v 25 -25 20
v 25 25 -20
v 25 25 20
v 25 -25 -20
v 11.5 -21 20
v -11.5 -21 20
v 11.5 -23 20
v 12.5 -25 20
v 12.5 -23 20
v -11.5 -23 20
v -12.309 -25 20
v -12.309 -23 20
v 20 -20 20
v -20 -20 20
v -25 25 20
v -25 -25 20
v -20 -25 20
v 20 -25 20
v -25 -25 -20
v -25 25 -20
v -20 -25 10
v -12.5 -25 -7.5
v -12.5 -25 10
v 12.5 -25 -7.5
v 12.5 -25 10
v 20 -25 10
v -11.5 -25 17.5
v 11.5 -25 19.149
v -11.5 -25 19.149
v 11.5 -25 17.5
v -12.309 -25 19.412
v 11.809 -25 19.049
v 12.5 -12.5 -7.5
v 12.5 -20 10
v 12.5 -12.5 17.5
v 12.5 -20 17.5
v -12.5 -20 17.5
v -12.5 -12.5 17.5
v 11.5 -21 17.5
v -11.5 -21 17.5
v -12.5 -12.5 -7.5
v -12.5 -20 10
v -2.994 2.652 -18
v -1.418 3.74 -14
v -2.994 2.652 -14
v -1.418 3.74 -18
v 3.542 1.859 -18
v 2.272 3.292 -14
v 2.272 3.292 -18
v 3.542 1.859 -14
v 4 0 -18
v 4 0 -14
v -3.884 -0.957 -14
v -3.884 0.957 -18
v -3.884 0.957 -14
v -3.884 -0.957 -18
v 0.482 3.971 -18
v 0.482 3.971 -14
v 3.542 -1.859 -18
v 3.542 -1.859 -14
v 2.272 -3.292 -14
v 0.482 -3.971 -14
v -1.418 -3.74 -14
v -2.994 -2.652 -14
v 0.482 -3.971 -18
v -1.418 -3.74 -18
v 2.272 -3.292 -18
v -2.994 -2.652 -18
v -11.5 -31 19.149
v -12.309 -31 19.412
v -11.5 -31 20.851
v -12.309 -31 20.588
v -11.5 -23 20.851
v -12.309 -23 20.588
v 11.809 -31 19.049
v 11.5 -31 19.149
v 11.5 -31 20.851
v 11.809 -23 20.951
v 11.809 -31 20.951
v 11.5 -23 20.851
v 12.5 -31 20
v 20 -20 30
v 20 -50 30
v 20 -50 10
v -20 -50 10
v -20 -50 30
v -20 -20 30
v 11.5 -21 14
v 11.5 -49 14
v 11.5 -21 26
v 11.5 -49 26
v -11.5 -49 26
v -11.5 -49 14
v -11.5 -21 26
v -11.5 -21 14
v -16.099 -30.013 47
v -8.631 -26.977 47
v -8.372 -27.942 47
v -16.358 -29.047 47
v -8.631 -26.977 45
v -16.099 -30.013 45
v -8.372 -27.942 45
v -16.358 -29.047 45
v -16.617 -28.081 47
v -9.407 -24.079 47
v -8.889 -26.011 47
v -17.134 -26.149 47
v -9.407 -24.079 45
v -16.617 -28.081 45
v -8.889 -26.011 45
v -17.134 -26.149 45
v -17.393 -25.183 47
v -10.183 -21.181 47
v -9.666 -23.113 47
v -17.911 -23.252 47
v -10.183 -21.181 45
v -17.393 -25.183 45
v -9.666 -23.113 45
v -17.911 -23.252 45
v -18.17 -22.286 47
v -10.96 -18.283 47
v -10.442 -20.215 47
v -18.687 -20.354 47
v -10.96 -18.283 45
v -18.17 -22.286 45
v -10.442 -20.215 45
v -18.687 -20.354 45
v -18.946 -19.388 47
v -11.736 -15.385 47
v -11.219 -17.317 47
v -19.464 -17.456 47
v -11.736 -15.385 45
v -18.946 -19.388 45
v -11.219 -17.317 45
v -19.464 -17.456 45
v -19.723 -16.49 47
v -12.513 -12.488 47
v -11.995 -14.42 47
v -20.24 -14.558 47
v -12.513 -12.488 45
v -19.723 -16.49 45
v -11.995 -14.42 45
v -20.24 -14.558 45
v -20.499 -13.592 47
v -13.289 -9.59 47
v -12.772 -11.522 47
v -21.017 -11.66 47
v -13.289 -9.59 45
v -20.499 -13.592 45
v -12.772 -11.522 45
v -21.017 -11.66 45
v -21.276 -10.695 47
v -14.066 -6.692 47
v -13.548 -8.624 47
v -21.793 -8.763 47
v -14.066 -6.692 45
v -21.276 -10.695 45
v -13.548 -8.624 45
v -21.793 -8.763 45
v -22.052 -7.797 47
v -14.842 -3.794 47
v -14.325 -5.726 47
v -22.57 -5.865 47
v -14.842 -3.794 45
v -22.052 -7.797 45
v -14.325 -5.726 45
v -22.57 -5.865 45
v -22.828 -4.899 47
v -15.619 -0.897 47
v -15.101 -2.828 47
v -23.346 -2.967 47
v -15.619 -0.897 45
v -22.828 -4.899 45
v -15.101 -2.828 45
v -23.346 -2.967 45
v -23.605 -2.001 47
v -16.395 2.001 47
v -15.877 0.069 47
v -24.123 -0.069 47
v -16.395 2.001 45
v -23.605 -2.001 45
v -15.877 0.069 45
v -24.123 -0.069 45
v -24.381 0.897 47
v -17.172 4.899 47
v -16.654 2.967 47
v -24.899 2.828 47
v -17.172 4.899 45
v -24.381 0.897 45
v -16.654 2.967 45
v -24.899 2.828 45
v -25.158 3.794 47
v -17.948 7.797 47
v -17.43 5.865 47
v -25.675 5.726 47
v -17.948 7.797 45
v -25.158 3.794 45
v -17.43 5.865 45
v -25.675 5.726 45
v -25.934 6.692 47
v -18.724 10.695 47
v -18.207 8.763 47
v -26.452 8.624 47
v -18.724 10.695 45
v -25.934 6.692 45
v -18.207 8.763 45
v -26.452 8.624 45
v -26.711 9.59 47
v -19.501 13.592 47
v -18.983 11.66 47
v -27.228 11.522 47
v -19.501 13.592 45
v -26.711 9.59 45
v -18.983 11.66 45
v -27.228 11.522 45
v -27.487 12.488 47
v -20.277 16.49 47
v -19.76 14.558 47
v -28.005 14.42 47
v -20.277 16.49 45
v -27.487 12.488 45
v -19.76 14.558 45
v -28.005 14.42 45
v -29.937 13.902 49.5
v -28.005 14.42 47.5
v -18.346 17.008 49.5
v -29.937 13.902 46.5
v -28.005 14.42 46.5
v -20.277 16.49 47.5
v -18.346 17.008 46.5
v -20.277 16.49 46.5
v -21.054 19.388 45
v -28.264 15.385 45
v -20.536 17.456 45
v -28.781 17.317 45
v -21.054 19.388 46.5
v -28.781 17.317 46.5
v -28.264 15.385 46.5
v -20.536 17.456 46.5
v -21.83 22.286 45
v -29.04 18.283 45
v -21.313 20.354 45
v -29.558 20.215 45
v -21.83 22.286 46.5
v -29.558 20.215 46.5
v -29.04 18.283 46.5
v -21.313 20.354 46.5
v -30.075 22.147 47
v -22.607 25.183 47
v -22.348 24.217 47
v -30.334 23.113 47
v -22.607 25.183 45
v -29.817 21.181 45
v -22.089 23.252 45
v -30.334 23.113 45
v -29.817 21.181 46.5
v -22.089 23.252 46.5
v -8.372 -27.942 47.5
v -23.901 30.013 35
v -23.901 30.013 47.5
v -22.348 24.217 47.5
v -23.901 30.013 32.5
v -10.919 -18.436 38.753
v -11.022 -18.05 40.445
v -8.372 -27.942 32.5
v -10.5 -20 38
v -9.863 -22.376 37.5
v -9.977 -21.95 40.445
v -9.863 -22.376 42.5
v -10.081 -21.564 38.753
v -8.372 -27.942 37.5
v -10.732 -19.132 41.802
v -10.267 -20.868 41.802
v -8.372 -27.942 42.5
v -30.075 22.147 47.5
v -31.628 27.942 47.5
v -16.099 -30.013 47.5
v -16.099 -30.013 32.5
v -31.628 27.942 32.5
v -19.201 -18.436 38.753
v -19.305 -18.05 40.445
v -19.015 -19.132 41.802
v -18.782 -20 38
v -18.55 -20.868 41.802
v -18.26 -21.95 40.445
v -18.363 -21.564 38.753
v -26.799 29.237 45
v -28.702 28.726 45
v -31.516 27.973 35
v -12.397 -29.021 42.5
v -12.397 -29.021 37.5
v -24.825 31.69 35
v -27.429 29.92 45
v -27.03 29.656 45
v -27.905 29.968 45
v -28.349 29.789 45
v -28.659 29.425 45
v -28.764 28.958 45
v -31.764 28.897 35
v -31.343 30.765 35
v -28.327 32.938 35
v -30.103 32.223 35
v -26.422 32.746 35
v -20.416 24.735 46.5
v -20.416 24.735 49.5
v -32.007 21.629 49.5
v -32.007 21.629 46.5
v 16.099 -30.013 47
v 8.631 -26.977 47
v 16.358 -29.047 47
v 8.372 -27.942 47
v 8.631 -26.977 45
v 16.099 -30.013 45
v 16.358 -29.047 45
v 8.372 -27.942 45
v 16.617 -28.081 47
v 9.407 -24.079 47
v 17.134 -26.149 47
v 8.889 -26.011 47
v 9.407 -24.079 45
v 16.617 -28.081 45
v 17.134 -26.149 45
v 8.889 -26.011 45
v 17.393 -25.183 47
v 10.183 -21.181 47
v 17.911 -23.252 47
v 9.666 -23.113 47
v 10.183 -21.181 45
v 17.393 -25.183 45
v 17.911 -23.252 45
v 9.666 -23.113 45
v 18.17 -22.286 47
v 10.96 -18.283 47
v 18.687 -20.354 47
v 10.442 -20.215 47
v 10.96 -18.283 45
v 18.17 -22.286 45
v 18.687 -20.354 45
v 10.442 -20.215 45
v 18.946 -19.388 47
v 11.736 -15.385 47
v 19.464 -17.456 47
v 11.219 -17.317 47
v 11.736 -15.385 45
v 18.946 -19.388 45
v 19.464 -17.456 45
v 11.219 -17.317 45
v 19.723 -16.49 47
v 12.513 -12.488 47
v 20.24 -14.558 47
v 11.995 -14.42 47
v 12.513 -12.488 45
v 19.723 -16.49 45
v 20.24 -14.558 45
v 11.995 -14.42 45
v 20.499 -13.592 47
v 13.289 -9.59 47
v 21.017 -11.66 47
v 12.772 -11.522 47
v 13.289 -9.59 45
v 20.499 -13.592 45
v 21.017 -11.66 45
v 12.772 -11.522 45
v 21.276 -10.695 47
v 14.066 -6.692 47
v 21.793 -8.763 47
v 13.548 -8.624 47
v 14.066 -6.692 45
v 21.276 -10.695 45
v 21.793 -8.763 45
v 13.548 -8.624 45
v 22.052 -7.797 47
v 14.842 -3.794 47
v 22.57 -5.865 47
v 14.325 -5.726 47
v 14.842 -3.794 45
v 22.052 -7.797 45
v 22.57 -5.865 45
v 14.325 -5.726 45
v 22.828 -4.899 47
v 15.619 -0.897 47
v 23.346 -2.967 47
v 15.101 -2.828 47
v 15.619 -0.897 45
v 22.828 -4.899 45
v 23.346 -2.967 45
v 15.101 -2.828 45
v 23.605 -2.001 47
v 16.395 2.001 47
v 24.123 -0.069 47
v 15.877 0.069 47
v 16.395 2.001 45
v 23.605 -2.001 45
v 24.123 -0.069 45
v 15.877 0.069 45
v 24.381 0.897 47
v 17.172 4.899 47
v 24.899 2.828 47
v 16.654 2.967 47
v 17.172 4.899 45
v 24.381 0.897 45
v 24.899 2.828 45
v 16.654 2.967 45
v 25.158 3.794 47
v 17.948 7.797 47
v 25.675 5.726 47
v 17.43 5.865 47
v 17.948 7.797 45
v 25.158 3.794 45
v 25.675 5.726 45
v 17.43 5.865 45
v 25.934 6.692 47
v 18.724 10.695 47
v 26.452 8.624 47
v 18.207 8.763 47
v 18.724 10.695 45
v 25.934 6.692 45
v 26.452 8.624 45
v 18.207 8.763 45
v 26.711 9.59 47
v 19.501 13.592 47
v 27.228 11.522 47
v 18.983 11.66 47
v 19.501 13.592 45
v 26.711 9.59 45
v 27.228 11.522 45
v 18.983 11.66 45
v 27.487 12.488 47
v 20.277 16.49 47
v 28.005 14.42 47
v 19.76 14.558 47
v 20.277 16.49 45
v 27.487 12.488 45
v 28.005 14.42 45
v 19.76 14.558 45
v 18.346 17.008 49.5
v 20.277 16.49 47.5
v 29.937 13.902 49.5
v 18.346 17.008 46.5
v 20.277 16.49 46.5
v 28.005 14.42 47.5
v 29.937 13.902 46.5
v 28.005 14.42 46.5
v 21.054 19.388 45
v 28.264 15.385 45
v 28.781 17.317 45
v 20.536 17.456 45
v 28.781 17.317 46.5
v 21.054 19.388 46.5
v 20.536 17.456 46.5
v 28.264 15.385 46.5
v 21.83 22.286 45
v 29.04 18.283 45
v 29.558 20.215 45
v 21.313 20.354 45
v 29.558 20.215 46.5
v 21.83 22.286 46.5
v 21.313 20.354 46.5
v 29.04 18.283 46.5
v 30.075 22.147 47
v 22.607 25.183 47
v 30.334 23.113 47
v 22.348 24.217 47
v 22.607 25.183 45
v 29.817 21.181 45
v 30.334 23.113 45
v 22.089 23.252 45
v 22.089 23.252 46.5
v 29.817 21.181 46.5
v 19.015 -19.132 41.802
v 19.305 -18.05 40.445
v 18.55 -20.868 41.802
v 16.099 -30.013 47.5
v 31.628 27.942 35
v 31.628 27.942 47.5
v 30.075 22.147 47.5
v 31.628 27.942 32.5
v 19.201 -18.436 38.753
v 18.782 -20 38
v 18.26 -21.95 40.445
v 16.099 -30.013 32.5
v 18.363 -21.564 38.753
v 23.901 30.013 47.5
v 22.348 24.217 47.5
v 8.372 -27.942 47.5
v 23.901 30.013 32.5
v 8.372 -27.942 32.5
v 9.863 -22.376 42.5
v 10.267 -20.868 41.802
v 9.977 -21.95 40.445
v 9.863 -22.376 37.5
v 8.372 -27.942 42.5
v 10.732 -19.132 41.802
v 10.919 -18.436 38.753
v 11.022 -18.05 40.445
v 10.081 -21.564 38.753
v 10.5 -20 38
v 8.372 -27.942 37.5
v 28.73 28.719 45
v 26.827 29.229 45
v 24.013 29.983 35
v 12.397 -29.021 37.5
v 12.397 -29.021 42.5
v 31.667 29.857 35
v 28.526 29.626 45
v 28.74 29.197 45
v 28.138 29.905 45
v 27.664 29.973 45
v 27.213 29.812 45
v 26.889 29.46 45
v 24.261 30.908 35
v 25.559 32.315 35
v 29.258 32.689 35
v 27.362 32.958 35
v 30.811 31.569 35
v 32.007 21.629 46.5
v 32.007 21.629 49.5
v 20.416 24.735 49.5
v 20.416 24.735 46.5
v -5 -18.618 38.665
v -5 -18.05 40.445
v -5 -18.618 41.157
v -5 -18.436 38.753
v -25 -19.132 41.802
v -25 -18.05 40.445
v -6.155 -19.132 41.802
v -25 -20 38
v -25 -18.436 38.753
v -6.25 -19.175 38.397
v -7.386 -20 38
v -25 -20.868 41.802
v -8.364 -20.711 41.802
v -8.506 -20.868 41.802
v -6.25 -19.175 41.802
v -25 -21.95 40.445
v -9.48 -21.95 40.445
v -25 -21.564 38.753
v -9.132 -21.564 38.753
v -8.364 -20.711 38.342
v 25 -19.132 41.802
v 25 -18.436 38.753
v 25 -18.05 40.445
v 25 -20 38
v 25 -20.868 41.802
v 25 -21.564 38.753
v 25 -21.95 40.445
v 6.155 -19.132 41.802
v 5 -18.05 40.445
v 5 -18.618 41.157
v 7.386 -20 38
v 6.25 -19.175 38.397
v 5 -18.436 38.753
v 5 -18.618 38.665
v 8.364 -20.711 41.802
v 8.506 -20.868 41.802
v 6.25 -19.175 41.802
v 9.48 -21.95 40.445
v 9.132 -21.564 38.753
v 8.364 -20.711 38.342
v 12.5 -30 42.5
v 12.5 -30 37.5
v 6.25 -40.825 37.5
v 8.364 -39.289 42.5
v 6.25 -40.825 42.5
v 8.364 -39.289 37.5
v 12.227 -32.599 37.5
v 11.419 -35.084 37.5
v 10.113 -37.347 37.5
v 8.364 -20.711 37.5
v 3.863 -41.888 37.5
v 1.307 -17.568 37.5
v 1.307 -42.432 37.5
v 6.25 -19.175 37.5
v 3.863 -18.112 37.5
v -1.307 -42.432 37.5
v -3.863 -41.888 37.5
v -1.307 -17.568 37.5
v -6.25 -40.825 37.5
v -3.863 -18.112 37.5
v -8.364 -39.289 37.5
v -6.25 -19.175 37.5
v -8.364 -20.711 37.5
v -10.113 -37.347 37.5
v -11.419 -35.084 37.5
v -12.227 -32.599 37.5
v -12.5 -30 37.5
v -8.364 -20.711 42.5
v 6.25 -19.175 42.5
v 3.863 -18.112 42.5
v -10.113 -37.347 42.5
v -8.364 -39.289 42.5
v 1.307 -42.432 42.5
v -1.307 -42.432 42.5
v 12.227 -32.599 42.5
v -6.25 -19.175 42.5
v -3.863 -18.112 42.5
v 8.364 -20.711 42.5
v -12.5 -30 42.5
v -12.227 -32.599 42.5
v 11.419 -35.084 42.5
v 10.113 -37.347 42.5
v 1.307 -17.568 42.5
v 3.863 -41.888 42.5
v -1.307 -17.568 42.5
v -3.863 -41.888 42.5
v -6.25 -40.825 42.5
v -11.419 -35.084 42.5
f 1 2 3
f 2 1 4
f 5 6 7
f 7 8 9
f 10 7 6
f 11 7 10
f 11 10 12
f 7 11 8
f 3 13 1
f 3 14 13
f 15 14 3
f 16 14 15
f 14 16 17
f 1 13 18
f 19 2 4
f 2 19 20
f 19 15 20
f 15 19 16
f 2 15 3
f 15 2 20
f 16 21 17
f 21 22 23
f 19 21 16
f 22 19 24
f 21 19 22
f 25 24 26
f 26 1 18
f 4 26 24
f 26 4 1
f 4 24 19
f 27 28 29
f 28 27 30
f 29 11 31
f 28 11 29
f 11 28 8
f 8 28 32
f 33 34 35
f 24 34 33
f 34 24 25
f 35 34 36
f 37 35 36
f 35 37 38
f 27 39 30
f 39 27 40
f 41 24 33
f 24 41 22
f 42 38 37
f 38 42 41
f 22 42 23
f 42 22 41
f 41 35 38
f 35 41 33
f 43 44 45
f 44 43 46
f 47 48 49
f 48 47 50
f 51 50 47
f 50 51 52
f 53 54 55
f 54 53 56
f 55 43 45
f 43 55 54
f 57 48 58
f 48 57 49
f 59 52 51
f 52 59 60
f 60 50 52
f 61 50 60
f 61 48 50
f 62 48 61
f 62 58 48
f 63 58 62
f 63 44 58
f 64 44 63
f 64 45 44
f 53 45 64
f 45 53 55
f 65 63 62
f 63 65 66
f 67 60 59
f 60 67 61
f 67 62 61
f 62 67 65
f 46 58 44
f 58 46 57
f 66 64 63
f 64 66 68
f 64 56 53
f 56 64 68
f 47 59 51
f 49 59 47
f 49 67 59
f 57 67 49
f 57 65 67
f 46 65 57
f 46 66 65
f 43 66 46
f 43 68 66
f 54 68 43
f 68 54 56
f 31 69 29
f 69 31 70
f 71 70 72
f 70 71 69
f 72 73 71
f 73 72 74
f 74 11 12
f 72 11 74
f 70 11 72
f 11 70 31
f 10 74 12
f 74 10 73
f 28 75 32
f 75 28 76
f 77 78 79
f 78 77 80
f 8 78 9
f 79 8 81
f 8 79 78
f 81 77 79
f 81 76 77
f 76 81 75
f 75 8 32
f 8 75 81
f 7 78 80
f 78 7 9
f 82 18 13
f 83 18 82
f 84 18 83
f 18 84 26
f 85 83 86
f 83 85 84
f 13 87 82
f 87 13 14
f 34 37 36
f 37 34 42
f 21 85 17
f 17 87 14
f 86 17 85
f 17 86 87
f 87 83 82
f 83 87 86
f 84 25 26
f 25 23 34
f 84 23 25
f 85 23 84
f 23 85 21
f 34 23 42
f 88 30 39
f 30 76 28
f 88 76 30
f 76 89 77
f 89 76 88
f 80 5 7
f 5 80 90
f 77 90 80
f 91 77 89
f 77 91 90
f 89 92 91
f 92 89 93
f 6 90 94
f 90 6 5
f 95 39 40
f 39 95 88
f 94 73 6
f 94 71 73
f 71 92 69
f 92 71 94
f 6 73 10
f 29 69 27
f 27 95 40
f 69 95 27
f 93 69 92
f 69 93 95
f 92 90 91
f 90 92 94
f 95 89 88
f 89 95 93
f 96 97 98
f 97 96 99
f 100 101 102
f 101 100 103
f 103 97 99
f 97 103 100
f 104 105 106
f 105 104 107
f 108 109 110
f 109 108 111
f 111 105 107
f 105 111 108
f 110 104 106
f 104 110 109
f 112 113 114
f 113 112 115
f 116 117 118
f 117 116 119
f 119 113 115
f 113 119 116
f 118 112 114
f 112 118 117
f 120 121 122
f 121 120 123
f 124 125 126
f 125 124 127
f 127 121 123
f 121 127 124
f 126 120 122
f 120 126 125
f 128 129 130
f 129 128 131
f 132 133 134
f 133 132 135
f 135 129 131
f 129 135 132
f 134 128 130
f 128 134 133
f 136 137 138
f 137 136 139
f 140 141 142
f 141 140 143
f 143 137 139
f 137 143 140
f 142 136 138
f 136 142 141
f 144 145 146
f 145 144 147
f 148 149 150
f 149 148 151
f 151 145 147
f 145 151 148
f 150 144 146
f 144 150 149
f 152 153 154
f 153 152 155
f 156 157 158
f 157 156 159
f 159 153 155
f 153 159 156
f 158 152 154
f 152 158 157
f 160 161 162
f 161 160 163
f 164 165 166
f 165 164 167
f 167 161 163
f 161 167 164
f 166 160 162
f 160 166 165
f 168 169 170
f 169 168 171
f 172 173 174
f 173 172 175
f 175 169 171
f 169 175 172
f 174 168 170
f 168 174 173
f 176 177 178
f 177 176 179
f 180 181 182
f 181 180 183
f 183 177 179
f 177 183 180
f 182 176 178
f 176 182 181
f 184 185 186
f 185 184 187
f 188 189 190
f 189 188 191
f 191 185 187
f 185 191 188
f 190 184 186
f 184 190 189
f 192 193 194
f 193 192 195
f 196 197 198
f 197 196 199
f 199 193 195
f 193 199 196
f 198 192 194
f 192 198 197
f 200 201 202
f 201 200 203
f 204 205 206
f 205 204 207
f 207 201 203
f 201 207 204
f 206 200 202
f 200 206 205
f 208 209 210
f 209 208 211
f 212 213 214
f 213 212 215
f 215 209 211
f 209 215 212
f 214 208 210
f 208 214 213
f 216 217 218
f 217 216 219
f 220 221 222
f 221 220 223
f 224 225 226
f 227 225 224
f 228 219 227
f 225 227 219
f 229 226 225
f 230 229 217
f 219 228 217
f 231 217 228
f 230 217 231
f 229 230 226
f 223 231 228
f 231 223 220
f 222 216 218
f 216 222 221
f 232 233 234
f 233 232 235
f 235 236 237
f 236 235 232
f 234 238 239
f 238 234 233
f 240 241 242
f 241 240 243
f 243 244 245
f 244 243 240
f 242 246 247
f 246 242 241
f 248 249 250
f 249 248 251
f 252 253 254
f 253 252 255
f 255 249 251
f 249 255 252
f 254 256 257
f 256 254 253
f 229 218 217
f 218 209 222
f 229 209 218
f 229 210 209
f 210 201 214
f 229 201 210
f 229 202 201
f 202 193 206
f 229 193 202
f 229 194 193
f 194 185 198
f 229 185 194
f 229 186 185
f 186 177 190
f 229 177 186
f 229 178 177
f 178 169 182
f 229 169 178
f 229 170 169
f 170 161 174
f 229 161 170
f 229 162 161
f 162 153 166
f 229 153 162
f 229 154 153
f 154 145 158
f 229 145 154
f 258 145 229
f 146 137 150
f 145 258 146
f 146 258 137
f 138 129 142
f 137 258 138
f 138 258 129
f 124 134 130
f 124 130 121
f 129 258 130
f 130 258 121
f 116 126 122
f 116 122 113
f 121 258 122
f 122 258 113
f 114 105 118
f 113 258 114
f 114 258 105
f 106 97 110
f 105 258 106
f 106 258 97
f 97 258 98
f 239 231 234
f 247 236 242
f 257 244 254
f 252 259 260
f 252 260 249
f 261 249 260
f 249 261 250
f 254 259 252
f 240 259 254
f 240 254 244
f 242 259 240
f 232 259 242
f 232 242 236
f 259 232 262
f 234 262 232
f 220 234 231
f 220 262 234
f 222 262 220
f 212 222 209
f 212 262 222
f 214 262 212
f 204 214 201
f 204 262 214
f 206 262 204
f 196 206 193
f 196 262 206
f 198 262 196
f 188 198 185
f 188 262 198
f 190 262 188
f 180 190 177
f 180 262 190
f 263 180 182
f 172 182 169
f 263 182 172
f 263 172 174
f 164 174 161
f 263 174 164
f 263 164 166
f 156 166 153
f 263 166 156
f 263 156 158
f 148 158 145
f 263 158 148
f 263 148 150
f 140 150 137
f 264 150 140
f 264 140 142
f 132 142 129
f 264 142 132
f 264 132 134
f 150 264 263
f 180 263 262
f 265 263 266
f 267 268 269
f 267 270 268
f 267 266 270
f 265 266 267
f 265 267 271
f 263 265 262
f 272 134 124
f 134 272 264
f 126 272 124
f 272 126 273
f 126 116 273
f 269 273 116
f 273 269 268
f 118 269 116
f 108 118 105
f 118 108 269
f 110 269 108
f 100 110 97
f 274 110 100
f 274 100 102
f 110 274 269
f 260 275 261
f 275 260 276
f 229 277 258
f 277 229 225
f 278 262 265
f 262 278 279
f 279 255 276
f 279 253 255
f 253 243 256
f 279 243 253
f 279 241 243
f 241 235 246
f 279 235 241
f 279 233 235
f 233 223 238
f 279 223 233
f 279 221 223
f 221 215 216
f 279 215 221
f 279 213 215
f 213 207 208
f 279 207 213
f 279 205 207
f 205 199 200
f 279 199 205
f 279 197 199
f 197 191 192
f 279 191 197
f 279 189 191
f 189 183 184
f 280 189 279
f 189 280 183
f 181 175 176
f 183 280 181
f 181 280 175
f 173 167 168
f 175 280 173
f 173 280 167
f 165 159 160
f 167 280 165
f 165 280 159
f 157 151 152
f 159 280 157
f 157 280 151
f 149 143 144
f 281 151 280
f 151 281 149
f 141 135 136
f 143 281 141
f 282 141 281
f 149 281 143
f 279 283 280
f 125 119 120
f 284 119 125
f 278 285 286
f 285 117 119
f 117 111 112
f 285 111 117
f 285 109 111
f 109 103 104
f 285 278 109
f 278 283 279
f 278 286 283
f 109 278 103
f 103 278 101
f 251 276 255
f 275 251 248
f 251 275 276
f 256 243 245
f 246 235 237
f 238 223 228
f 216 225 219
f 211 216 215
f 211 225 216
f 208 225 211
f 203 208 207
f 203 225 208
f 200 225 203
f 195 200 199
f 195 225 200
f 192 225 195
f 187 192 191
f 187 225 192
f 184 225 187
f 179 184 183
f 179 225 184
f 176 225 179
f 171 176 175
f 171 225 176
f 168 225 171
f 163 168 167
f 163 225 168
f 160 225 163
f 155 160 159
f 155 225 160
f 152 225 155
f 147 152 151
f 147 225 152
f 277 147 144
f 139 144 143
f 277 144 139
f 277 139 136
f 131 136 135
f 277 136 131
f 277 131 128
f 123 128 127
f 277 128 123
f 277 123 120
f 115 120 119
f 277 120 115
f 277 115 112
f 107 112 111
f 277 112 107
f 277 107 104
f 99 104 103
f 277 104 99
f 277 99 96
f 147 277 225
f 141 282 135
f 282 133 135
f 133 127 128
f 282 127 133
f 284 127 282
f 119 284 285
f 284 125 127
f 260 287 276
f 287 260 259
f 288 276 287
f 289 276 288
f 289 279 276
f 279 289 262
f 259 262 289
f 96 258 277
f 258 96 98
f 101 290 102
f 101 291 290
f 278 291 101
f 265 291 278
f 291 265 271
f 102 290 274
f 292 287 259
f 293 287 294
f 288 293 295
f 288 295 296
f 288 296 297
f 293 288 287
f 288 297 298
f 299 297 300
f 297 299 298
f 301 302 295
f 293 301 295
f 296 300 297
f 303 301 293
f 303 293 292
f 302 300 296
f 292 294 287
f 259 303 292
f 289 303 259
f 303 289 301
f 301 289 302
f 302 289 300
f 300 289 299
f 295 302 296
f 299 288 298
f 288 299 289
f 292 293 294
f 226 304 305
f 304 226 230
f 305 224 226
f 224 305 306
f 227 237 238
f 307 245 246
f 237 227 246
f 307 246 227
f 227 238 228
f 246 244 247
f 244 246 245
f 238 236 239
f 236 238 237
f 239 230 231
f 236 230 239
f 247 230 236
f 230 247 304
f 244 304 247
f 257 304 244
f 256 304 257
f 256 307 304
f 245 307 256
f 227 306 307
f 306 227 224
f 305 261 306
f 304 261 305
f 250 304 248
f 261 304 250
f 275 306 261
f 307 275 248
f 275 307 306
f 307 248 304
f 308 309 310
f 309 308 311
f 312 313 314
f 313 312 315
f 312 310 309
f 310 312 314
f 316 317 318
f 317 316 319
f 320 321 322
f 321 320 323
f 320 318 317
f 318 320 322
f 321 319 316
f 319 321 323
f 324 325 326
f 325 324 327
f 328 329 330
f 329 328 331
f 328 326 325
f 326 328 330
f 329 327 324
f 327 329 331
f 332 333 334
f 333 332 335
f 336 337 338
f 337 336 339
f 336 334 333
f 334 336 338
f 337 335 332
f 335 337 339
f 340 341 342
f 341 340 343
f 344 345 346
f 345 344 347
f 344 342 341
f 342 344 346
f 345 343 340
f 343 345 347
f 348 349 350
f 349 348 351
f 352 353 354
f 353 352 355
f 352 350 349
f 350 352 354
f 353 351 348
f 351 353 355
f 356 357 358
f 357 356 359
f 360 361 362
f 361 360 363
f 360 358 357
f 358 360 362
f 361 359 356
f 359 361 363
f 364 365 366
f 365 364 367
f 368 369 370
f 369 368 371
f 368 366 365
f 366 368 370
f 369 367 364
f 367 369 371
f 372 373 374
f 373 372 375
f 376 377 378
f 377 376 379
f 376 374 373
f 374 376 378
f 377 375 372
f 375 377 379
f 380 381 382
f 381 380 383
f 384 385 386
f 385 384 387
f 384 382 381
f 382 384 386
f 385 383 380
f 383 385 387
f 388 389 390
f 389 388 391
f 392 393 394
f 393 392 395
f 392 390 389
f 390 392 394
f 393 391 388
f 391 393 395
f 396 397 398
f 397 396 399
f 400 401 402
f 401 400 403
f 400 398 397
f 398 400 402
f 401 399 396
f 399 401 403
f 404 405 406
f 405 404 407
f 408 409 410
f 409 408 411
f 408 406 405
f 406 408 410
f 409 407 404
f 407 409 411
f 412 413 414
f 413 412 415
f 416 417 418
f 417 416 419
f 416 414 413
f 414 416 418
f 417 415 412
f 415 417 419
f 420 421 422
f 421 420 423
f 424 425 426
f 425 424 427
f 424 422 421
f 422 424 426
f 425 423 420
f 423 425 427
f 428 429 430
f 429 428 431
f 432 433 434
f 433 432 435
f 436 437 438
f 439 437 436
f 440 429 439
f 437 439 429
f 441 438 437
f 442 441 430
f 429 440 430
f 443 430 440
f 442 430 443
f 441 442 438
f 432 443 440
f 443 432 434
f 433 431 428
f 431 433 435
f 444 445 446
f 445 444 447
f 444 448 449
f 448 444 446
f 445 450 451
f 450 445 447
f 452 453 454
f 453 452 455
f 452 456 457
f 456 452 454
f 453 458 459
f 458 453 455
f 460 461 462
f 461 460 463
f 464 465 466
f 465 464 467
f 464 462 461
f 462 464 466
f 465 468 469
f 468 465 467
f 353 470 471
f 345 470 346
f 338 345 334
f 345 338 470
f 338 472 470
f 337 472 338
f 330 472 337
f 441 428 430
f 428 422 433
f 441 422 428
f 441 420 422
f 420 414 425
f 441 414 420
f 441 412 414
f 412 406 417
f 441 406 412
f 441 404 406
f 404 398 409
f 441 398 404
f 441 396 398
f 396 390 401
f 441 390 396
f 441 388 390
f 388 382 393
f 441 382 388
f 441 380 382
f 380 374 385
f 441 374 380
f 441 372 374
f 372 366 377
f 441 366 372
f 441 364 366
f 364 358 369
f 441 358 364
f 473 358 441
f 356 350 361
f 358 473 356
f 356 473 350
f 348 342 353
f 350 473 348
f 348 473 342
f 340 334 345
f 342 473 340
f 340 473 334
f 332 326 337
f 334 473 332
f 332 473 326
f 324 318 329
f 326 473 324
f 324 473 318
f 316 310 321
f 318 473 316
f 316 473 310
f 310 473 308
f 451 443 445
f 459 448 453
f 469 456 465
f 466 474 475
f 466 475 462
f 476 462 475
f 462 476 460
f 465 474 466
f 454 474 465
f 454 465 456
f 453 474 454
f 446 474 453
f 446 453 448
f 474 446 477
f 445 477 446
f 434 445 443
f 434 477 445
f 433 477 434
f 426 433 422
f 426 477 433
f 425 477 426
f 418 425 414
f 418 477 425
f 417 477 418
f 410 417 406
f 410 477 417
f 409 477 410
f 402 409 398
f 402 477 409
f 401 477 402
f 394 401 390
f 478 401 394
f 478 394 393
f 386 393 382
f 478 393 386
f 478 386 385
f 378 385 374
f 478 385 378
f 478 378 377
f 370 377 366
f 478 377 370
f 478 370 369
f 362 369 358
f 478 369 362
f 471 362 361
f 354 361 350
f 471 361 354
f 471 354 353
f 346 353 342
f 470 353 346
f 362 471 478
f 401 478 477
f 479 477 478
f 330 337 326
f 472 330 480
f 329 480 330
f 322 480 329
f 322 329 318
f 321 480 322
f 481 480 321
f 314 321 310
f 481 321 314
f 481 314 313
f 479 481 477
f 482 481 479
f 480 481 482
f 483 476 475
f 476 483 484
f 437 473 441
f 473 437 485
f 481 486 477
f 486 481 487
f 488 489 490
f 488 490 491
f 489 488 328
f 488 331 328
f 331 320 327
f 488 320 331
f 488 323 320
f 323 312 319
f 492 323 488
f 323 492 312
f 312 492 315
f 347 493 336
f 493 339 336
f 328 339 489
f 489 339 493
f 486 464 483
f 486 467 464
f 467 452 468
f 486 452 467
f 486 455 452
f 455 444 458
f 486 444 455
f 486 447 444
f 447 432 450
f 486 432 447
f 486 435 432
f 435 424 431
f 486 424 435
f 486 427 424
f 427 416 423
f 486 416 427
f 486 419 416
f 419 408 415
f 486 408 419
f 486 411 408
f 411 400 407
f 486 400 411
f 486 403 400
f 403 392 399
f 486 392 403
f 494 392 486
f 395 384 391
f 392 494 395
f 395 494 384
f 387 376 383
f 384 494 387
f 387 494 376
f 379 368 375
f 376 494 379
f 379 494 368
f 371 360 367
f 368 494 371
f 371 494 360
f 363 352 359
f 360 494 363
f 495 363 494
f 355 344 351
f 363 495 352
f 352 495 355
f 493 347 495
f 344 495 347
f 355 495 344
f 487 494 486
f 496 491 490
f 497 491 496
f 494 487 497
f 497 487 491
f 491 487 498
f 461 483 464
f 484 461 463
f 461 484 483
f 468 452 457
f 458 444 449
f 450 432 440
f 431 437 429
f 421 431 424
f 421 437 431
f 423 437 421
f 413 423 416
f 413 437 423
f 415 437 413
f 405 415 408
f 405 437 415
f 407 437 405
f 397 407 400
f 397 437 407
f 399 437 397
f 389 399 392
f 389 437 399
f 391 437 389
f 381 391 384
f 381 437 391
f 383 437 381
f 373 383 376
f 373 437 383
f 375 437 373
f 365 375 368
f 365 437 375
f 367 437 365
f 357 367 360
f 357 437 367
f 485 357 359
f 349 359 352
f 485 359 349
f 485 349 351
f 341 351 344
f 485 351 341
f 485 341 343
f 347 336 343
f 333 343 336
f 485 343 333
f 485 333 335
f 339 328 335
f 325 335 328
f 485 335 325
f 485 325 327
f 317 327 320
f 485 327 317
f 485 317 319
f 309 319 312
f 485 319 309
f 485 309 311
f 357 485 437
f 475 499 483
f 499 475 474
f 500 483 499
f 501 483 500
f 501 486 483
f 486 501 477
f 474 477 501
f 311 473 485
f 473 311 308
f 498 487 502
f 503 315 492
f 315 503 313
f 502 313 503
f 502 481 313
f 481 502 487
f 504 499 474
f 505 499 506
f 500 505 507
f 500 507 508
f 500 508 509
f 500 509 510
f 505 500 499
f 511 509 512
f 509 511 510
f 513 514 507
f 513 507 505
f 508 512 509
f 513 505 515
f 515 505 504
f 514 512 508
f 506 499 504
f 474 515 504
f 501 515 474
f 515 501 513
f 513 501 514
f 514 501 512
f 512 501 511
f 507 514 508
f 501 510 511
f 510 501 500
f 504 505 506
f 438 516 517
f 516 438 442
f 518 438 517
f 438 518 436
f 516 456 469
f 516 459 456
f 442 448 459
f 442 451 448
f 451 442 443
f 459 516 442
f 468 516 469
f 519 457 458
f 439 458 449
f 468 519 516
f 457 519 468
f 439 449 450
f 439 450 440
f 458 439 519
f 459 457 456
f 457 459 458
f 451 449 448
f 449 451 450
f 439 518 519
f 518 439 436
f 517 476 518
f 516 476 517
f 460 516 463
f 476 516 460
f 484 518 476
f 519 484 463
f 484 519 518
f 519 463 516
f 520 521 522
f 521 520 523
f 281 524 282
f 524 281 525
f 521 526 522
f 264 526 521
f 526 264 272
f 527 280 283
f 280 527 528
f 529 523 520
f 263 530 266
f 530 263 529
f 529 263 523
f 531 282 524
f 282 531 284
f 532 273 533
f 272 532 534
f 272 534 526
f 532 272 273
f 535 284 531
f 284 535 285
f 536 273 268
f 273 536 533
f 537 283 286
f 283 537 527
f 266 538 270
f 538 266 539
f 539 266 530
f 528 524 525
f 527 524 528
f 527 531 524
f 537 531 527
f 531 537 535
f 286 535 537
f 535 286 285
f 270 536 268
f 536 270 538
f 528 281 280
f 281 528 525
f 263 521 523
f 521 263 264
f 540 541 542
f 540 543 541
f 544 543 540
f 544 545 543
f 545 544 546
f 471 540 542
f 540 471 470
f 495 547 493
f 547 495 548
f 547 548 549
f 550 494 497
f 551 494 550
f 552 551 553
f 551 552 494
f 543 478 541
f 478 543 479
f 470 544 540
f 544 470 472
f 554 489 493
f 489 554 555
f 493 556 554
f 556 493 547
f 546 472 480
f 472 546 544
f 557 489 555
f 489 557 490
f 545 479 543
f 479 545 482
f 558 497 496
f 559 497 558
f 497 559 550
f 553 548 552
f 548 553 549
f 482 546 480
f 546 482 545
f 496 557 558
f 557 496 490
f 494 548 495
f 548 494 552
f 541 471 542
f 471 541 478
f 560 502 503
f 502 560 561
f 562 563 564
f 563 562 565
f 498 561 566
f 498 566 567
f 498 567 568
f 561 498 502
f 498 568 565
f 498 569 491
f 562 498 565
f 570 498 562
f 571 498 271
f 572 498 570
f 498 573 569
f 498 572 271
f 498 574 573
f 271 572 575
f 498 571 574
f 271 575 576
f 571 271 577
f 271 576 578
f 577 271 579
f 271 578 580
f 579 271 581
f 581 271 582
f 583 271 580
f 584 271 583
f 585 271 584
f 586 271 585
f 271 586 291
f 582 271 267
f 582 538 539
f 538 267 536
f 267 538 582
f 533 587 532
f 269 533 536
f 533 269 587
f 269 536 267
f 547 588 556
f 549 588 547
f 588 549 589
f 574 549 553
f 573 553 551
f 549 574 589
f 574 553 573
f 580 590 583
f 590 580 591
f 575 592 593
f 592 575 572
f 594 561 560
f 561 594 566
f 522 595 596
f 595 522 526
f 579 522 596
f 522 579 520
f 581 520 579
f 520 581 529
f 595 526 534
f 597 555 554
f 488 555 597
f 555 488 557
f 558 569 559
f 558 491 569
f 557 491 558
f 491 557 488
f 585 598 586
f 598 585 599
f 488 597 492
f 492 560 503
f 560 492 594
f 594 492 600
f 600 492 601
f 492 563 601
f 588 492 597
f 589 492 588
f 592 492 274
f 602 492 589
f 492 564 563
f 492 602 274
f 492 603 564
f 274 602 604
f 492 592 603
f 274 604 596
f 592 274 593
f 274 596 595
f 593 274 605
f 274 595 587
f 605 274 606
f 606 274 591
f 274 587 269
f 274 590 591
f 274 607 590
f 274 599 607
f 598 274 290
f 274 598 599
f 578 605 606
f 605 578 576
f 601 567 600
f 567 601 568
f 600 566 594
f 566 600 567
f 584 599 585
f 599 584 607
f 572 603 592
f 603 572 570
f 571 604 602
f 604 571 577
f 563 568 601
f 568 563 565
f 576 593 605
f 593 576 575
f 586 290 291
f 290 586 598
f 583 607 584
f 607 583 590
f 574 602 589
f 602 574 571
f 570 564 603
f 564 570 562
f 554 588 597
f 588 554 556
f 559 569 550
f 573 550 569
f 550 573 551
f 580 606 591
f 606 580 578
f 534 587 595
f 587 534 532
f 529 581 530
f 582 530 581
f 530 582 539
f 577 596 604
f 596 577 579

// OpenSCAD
/*
 * ================================================================
 * PARAMETRIC ROBOTIC GRIPPER
 * Servo-actuated gripper with customizable finger geometry
 * ================================================================
 */

/* ----------------------------- USER PARAMETERS ----------------------------- */

// Gripper Dimensions
grip_width = 80;           // Maximum grip opening (mm)
finger_length = 60;        // Length of gripper fingers (mm)
finger_thickness = 8;      // Thickness of fingers (mm)
base_width = 50;           // Width of gripper base (mm)
base_height = 40;          // Height of gripper base (mm)

// Servo Configuration
servo_type = "SG90";       // Servo type: "SG90", "MG996R", "Custom"
servo_mount_spacing = 23;  // Distance between servo mounting holes (mm)
servo_horn_diameter = 25;  // Diameter of servo horn (mm)

// Finger Design
finger_tip_shape = "pointed"; // "pointed", "flat", "rounded", "custom"
grip_surface = "textured";    // "smooth", "textured", "ridged"
finger_angle = 15;            // Angle of finger taper (degrees)

// Mechanical Features
gear_ratio = 2;            // Mechanical advantage ratio
jaw_force = 10;            // Target gripping force (N)
include_sensors = true;    // Add pressure sensor mounts
quick_release = true;      // Include quick-release mechanism

/* ----------------------------- MAIN GEOMETRY ----------------------------- */

module robotic_gripper() {
    union() {
        // Base assembly
        gripper_base();
        
        // Servo mount
        translate([0, -base_width/2 - 10, base_height/2])
            rotate([90, 0, 0])
                servo_mount();
        
        // Gripper arms
        translate([0, 0, base_height])
            gripper_mechanism();
    }
}

module gripper_base() {
    difference() {
        cube([base_width, base_width, base_height], center=true);
        
        // Servo cutout
        translate([0, -base_width/2 + 5, 5])
            cube([25, 15, 25], center=true);
        
        // Wiring channel
        translate([0, 0, -base_height/2 + 2])
            cylinder(d=8, h=4);
    }
}

module servo_mount() {
    difference() {
        cube([40, 20, 30], center=true);
        
        // Servo body cutout
        cube([23, 12, 28], center=true);
        
        // Mounting holes
        for (x = [-servo_mount_spacing/2, servo_mount_spacing/2]) {
            translate([x, 0, -12])
                cylinder(d=2, h=8);
        }
    }
}

module gripper_mechanism() {
    // Left finger assembly
    translate([-grip_width/4, 0, 0])
        gripper_finger("left");
    
    // Right finger assembly  
    translate([grip_width/4, 0, 0])
        gripper_finger("right");
    
    // Linkage mechanism
    gripper_linkage();
}

module gripper_finger(side) {
    rotate([0, 0, side == "left" ? finger_angle : -finger_angle]) {
        difference() {
            // Main finger body
            cube([finger_thickness, finger_length, 15], center=true);
            
            // Grip surface texture
            if (grip_surface == "textured") {
                for (i = [0:3:finger_length-5]) {
                    translate([0, -finger_length/2 + i, 6])
                        cube([finger_thickness+1, 2, 2], center=true);
                }
            }
        }
        
        // Finger tip
        translate([0, finger_length/2, 0])
            finger_tip();
        
        // Pressure sensor mount
        if (include_sensors) {
            translate([0, finger_length/3, 8])
                cube([12, 8, 3], center=true);
        }
    }
}

module finger_tip() {
    if (finger_tip_shape == "pointed") {
        cylinder(d1=finger_thickness, d2=2, h=10, center=true);
    } else if (finger_tip_shape == "flat") {
        cube([finger_thickness, 3, 15], center=true);
    } else if (finger_tip_shape == "rounded") {
        sphere(d=finger_thickness);
    }
}

module gripper_linkage() {
    // Connecting rods
    for (side = [-1, 1]) {
        translate([side * 15, -20, 0]) {
            rotate([0, 90, 0])
                cylinder(d=4, h=20, center=true);
        }
    }
    
    // Servo connection
    translate([0, -30, 0])
        cylinder(d=servo_horn_diameter, h=5, center=true);
}

robotic_gripper();
